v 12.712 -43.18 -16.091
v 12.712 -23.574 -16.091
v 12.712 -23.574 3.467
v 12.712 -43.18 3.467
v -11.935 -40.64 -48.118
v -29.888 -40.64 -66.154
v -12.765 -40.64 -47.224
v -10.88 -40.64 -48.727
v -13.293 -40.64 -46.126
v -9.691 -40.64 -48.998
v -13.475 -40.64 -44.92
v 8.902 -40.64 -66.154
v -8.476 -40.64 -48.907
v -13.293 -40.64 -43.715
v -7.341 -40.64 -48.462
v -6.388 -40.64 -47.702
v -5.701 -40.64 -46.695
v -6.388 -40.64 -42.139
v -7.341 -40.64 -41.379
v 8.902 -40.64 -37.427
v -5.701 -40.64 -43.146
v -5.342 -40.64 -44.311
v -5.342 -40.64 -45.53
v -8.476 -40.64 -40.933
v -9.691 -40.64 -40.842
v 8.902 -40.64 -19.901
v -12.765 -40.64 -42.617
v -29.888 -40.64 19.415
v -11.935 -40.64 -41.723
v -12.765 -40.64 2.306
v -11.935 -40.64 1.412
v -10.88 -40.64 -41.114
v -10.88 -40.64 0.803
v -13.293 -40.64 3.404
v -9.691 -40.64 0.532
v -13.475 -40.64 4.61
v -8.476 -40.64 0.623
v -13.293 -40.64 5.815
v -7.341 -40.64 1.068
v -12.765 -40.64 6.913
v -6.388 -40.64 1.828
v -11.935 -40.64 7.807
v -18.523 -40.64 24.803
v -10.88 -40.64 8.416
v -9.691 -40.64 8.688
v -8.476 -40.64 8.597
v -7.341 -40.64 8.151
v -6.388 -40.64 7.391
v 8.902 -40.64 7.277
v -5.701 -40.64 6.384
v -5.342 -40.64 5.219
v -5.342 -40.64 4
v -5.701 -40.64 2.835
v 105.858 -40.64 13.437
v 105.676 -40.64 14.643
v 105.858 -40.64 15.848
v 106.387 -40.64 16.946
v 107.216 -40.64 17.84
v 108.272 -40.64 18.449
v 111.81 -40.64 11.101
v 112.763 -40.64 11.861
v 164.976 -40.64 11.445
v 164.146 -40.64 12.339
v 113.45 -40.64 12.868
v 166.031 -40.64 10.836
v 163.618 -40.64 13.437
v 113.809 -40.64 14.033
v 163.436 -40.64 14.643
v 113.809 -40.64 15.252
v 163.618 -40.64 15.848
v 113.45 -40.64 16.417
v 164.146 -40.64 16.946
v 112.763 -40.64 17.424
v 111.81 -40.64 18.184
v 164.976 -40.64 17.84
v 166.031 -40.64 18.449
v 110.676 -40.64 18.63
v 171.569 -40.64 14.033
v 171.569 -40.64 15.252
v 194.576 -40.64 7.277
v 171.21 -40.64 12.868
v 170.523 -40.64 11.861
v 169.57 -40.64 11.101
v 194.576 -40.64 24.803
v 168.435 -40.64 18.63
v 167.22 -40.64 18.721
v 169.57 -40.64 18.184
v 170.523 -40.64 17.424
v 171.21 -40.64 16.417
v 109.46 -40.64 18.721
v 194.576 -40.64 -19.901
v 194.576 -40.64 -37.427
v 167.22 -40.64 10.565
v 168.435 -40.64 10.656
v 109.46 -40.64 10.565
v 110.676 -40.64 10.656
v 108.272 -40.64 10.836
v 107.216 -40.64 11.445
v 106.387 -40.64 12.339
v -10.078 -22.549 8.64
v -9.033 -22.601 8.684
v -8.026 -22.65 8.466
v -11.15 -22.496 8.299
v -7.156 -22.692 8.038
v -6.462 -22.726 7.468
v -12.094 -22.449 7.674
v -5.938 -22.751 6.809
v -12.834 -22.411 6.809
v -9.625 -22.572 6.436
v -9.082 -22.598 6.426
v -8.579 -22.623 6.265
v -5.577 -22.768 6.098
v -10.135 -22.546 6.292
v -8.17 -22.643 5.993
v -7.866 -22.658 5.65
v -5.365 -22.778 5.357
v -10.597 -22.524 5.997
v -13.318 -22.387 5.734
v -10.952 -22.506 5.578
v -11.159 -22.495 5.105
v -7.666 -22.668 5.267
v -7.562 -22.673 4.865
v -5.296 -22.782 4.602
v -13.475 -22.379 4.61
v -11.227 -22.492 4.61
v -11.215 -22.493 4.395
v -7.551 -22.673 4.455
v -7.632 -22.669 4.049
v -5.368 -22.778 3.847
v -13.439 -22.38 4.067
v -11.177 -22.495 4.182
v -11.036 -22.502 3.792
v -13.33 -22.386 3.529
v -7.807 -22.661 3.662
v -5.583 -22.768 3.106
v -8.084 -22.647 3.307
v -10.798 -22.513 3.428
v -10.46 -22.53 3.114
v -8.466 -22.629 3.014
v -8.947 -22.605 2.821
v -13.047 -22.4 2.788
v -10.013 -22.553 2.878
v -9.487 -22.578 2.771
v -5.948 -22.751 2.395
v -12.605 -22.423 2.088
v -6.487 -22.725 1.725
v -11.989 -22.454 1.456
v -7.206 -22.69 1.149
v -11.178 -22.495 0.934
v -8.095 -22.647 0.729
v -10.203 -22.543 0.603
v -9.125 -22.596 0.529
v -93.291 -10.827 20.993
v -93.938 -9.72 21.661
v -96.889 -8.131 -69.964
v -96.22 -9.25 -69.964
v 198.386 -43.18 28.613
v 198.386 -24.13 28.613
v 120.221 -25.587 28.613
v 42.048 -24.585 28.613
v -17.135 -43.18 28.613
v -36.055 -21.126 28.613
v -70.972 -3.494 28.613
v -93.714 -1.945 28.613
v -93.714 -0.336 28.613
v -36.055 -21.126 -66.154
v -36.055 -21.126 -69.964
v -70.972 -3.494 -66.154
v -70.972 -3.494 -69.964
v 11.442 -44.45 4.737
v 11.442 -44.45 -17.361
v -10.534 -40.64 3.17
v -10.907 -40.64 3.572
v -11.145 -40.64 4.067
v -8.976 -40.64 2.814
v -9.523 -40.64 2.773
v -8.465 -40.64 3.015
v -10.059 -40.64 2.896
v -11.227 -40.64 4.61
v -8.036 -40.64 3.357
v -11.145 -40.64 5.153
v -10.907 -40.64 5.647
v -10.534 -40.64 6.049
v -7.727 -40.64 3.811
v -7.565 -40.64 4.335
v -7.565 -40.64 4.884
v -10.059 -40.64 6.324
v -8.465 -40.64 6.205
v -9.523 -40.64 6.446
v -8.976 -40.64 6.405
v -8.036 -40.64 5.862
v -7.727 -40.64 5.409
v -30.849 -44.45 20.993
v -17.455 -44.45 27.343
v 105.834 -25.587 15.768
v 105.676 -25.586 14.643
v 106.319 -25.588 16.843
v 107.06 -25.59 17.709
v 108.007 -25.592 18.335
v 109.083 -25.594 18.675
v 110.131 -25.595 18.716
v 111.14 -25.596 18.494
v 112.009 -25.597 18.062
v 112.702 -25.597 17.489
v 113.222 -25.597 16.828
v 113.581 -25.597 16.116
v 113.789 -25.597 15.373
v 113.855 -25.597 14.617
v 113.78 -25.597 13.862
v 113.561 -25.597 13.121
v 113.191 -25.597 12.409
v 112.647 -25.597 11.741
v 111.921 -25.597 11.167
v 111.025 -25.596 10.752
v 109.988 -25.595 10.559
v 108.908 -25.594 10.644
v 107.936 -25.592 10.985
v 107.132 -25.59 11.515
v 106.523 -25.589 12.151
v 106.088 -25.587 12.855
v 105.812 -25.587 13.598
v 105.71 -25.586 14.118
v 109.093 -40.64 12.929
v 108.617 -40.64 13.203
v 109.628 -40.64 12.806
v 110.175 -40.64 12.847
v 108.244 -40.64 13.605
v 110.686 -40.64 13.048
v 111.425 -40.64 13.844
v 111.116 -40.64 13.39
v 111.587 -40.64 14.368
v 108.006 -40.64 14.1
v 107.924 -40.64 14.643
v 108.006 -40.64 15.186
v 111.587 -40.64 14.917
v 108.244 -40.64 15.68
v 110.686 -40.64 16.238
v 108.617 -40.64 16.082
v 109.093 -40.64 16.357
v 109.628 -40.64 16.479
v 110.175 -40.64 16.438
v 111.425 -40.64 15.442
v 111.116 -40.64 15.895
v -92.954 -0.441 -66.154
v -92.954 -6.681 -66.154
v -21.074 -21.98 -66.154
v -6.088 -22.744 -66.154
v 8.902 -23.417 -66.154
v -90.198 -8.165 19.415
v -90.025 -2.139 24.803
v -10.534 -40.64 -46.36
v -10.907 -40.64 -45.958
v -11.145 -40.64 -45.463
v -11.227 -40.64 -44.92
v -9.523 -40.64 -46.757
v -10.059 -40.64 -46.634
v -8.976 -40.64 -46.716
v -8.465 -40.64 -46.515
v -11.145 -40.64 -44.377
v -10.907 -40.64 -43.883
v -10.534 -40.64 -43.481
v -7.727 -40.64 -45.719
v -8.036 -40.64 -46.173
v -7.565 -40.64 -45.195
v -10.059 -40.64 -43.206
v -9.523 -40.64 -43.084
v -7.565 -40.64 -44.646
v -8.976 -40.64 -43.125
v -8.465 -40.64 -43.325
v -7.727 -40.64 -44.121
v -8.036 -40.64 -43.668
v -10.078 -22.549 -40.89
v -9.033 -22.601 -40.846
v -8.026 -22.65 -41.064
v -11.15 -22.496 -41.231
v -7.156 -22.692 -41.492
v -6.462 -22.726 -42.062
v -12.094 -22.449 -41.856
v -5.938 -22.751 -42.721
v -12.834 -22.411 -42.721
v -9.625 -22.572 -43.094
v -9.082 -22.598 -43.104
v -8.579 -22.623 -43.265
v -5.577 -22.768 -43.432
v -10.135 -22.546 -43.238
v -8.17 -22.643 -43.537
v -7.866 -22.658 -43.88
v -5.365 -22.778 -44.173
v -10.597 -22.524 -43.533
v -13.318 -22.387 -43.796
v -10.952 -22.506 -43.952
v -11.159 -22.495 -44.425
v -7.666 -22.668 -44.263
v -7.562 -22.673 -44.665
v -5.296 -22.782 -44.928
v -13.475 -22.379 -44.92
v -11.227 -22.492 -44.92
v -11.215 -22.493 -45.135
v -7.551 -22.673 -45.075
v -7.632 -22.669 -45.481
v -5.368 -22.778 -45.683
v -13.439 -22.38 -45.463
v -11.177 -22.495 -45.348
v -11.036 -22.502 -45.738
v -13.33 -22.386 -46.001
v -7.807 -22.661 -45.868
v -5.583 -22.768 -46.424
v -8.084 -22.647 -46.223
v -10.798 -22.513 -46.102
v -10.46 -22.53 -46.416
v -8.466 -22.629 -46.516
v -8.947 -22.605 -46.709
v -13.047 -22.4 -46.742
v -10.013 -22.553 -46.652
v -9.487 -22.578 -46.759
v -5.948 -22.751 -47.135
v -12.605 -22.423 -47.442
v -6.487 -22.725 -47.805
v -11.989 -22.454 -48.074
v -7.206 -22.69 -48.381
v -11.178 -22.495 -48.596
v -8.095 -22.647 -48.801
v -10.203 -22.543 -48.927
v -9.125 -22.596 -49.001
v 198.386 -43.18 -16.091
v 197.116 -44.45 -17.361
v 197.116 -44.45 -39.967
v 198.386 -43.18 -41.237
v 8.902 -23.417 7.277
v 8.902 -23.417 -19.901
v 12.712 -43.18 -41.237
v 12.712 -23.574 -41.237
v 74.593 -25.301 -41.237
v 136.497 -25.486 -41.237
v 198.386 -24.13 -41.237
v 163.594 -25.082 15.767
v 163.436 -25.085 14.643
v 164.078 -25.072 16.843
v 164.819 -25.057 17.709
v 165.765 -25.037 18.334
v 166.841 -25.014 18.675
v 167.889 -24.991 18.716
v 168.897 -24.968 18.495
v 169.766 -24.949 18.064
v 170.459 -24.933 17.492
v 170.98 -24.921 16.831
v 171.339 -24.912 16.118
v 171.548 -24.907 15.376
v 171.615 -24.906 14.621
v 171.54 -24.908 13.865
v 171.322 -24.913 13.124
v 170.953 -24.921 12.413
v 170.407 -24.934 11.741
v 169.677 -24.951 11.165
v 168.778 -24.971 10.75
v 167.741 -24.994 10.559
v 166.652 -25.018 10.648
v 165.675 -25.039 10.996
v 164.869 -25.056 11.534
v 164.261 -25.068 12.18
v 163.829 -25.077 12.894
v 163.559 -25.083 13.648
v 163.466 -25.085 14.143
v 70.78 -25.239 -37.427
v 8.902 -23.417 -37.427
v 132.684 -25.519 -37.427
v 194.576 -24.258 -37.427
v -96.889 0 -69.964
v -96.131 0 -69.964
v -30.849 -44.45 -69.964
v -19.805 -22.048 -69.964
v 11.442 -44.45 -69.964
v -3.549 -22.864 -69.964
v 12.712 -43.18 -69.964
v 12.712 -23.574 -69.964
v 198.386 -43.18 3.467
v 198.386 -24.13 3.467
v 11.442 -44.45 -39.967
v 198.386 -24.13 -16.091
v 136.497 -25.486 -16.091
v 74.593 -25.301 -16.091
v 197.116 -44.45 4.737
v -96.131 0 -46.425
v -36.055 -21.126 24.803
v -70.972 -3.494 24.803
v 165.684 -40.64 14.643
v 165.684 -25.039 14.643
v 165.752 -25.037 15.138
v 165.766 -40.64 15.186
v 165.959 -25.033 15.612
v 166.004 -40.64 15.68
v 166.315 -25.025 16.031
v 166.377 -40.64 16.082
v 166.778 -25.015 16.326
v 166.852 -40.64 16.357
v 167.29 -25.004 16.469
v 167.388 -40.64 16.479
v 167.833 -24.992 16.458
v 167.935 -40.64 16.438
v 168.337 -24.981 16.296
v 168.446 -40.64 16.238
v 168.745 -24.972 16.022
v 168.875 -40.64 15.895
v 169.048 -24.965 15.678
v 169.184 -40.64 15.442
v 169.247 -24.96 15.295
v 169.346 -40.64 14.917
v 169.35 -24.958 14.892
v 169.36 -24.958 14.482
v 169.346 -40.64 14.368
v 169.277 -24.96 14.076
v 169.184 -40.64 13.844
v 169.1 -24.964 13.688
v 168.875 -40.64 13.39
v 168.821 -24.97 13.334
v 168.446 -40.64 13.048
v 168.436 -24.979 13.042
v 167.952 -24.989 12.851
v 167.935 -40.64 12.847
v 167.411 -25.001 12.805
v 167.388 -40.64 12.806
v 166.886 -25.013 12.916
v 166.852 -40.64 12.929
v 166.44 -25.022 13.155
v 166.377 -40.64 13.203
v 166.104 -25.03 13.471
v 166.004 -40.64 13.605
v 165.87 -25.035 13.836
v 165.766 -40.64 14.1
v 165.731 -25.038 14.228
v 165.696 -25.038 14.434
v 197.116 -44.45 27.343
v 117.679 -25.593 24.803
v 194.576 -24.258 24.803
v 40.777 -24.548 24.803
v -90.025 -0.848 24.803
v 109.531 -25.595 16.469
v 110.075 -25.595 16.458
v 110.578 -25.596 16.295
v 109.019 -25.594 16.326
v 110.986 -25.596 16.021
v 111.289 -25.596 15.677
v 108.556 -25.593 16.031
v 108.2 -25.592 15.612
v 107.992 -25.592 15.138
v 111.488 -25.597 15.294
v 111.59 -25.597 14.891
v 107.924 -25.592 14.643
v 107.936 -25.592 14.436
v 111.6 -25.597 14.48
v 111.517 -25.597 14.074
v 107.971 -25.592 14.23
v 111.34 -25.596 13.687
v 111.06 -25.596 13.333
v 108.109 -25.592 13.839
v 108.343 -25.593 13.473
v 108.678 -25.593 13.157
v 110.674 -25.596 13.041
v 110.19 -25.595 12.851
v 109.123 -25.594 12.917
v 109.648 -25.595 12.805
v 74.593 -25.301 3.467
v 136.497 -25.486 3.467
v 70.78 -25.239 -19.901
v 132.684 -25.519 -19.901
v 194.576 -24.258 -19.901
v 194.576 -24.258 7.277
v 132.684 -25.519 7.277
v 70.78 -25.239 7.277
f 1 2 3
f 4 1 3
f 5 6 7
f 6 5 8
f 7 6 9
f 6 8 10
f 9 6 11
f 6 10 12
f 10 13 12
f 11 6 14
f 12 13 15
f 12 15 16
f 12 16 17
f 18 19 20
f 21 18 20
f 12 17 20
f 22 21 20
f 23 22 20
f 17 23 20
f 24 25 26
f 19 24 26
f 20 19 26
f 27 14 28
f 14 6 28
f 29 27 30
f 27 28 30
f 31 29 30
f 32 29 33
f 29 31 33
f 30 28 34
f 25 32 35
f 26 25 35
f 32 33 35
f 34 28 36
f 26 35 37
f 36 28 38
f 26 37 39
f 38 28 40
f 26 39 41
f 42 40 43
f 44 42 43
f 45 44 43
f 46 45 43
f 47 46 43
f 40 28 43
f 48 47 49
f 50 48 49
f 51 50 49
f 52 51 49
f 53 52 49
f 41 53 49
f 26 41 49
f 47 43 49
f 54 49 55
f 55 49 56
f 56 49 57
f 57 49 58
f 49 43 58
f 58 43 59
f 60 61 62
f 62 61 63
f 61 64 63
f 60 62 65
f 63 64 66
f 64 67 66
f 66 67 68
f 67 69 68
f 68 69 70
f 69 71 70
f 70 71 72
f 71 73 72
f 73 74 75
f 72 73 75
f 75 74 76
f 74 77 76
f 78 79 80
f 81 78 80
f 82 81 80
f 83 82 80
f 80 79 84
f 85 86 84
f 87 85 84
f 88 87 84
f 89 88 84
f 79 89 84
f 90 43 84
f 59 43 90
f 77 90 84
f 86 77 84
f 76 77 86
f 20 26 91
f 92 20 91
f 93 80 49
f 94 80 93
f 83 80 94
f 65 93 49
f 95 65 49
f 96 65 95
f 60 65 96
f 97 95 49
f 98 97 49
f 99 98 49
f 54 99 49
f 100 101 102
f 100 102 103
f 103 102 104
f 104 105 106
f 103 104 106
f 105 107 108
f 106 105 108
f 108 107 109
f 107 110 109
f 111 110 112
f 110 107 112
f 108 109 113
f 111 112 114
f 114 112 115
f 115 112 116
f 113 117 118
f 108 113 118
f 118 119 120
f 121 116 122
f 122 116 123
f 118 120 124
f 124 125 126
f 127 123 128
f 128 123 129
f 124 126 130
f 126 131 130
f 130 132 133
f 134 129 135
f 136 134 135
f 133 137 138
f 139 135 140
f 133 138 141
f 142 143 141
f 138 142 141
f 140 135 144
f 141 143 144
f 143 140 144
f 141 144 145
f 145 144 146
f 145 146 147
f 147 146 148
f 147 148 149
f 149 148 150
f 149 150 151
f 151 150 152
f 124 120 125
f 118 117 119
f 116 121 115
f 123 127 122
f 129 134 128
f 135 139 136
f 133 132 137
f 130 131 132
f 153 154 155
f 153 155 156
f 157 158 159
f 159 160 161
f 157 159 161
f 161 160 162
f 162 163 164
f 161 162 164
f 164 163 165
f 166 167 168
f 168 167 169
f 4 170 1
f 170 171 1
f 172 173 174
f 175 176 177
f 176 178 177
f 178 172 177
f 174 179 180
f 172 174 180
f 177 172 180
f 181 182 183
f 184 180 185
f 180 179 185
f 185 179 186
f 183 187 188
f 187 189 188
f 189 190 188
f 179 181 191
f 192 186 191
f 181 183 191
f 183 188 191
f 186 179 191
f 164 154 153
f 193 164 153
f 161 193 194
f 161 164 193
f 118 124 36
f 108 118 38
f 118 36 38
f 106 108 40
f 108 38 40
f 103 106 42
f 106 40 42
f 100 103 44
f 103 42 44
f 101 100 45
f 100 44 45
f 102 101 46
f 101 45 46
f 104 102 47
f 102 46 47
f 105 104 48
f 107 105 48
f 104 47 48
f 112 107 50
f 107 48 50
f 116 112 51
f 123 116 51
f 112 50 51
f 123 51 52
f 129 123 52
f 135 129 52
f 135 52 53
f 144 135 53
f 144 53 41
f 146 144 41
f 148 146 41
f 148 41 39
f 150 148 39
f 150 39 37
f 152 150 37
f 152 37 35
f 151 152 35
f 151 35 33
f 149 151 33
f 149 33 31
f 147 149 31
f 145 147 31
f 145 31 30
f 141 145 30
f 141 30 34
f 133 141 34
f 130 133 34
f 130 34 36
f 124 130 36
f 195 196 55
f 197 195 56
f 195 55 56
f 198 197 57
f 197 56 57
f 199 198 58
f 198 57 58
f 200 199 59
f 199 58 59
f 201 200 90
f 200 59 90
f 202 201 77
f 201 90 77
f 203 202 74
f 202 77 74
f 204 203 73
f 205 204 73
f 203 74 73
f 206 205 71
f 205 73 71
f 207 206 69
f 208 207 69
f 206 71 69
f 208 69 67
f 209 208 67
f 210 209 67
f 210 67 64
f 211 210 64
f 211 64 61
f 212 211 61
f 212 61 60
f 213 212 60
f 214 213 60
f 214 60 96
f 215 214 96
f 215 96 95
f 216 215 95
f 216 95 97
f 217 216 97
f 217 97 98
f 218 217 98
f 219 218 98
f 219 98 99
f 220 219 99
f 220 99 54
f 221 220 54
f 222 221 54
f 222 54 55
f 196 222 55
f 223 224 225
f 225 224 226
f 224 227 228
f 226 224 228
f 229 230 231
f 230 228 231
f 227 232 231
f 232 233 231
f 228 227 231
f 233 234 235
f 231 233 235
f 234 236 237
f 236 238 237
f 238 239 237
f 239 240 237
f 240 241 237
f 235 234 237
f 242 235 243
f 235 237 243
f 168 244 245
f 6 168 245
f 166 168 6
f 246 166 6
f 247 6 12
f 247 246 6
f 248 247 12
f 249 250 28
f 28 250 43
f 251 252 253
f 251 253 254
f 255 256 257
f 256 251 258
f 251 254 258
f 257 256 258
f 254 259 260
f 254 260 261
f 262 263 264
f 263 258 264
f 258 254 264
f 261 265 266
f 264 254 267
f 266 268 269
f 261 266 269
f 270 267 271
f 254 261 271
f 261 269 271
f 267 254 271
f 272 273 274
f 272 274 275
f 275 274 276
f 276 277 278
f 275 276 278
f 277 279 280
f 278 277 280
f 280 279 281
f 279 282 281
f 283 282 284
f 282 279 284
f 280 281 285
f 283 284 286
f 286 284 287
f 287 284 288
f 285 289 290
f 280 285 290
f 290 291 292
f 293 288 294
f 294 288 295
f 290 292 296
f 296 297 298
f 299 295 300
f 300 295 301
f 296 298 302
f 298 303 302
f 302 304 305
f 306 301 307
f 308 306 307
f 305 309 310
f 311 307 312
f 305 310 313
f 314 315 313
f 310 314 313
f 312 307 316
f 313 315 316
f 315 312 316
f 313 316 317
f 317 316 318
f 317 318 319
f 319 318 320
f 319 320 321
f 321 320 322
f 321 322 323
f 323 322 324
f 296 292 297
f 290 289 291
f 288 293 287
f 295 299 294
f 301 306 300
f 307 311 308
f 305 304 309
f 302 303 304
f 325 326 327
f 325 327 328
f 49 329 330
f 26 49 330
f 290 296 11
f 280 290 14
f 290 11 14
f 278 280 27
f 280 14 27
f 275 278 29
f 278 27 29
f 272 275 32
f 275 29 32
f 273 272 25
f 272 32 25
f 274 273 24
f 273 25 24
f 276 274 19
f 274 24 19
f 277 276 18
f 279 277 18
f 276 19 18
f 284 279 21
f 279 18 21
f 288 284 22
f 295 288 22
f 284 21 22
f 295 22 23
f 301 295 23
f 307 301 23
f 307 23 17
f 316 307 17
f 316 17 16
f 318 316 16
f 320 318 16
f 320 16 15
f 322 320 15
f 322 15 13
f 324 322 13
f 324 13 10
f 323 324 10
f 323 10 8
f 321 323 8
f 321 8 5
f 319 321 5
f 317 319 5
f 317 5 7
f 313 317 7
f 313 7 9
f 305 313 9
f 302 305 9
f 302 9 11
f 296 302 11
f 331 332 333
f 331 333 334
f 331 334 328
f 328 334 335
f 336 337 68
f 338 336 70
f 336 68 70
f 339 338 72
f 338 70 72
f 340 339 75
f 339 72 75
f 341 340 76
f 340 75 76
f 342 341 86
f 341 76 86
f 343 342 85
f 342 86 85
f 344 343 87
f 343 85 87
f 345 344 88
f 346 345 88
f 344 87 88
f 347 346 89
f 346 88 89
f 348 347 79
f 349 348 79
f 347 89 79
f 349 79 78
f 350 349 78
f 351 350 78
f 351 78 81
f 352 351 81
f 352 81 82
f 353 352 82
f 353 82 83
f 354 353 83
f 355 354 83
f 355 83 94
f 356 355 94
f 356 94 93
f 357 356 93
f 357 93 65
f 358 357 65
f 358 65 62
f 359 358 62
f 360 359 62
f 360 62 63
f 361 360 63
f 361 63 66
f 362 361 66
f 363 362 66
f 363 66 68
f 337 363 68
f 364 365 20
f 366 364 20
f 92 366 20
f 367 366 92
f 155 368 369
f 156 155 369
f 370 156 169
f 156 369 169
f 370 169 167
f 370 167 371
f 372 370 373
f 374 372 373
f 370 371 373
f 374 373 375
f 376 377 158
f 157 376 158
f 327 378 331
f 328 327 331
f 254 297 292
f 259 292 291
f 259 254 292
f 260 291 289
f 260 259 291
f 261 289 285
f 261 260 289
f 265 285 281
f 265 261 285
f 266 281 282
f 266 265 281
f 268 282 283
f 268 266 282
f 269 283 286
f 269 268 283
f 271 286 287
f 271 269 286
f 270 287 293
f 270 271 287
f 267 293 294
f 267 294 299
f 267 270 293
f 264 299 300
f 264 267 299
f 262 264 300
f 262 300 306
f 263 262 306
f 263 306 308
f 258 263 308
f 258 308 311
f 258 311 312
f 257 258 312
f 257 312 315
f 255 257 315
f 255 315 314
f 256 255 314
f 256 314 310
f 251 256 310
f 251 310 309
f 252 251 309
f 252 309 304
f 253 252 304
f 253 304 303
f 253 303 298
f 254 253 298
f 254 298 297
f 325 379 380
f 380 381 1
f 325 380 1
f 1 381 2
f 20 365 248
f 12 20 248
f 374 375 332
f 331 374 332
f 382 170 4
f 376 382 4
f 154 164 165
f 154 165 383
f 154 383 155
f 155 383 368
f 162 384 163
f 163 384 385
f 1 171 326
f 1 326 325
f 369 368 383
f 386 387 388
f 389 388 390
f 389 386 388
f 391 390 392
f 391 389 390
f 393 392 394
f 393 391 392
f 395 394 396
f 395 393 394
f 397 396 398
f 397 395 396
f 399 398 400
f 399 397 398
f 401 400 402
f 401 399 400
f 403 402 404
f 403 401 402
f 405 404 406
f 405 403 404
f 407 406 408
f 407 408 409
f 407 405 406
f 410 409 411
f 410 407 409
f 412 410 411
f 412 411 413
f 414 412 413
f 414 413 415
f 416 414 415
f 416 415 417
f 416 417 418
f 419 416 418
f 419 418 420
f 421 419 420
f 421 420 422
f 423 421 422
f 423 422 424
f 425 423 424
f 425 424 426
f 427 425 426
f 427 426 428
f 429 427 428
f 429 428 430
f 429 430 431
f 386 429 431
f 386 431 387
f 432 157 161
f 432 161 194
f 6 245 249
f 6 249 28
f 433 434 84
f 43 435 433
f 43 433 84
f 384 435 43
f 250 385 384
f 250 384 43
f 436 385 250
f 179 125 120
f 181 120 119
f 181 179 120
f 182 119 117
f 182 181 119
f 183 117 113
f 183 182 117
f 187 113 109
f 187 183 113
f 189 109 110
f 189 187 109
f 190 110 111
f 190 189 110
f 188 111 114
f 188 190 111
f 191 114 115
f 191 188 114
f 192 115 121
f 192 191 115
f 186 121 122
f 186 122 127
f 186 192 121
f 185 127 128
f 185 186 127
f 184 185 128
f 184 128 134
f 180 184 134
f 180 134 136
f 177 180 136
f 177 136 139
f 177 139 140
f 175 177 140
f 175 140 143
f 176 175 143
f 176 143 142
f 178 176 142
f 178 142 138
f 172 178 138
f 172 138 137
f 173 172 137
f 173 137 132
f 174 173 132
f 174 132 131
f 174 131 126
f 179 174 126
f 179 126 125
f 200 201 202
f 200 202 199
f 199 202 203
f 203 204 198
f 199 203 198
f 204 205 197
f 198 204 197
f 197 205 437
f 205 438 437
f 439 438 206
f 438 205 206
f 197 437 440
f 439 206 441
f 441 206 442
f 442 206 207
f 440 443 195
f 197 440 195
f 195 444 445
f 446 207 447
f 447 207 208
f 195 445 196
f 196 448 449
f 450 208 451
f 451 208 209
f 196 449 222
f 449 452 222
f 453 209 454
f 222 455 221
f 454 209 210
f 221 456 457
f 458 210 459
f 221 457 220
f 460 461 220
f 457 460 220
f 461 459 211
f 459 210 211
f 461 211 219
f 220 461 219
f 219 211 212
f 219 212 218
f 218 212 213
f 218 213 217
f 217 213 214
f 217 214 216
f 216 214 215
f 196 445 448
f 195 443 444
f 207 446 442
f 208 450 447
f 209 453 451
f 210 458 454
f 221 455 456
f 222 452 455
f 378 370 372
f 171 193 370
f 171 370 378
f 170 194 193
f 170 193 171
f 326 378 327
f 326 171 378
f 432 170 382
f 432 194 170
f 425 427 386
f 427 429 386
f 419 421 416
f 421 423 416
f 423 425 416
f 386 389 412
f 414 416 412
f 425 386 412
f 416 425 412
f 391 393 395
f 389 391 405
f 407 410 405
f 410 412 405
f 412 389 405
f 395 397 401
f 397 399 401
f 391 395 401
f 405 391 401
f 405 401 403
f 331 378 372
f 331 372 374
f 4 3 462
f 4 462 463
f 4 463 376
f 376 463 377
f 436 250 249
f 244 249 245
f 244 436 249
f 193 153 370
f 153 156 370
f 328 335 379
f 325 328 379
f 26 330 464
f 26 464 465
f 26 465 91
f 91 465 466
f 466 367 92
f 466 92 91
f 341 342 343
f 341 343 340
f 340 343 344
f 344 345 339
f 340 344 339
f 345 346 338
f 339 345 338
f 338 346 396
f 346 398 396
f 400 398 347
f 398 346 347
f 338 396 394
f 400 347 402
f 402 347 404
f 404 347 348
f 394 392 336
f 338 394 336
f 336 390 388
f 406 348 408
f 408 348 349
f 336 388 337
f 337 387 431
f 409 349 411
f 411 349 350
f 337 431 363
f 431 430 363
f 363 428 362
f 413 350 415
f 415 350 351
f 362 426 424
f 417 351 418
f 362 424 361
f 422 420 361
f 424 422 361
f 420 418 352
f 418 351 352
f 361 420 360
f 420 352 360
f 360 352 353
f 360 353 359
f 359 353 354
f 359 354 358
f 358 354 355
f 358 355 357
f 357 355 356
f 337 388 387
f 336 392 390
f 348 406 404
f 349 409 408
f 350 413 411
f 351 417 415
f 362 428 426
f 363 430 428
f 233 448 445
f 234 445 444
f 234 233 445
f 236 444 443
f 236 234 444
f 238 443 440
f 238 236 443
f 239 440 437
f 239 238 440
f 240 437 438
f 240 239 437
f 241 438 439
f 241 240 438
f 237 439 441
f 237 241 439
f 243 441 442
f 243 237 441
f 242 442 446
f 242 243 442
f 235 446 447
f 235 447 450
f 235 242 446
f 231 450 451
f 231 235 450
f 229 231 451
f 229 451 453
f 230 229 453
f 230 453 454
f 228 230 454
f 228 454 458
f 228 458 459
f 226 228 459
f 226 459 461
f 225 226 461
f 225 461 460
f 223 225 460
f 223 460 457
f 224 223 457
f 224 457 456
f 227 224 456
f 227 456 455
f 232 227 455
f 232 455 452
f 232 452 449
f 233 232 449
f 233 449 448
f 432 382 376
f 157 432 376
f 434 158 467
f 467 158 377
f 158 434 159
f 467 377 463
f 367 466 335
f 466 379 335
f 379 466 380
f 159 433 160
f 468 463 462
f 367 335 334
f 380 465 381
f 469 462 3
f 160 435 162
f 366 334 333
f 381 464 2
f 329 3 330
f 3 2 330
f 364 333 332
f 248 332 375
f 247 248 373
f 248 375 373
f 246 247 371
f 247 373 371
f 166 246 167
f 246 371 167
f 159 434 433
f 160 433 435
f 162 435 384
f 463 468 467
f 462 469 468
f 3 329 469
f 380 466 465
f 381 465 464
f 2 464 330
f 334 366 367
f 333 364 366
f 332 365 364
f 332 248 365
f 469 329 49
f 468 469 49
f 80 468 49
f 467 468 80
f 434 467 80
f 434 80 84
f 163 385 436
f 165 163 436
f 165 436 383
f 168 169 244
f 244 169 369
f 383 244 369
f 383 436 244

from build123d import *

# Parameters (mm, degrees)
F1_DEPTH     = 44.45
F4_DEPTH     = 98.5780825813
F5_SIZE      = 7.62
F6_T1_DEPTH  = 219.6945102582
F6_T3_DEPTH  = 31.6780747894
F6_T5_DEPTH  = 188.9400373947
F6_T7_DEPTH  = 31.6780747894
F6_T9_DEPTH  = 31.993119976
F6_T11_DEPTH = 19.558
F6_T13_DEPTH = 95.0320985588
F6_T19_DEPTH = 188.9400373947
F6_T23_DEPTH = 22.8240373947
F6_T30_DEPTH = 22.8240373947
F6_T34_DEPTH = 188.9400373947
F6_T41_DEPTH = 31.993119976
F6_T45_DEPTH = 188.9400373947
F7_T         = 3.81
F7_T3_DEPTH  = 9.8197045255
F7_T5_DEPTH  = 50.8
F7_T7_DEPTH  = 9.8197045256
F7_T9_DEPTH  = 9.8197045255
F8_R         = 4.0894
F8_R_2       = 1.8415
F9_DEPTH     = 40.64
F10_DEPTH    = 127


# Not quite as in the source:
# - a fillet or chamfer that OpenCascade refuses, or shapes differently, is made with other operations: its cross-section is extruded or revolved along the edge and cut away or added
# - a shell that OpenCascade refuses in one call is made with other operations: the cavity is built on its own and cut out


with BuildPart() as f1:
    # F0 (on Front) → F1 (new body)
    with BuildSketch(Plane.XZ):
        Polygon((-27.6737742102, 28.612719938), (-93.7137742102, 28.612719938), (-96.8887742102, -69.9643626433), (-17.5137742102, -69.9643626433), (12.7122257898, -69.9643626433), (12.7122257898, -41.237280062), (198.3862257898, -41.237280062), (198.3862257898, -16.091280062), (12.7122257898, -16.091280062), (12.7122257898, 3.466719938), (198.3862257898, 3.466719938), (198.3862257898, 28.612719938), align=None)
    extrude(amount=F1_DEPTH)

    # F2 (on face) → F4 (cut, through all)
    with BuildSketch(Plane(origin=(0, 0, -69.9643626433), x_dir=(1, 0, 0), z_dir=(0, 0, -1))):
        Polygon((-96.8887742102, 44.45), (-96.8887742102, 8.89), (-30.8487742102, 44.45), align=None)
    extrude(amount=-F4_DEPTH, mode=Mode.SUBTRACT)

    # F5
    f5_edges = [f1.edges().sort_by_distance(p)[0] for p in [
        (-62.281274, -27.524808, 28.61272),
    ]]
    chamfer(f5_edges, length=F5_SIZE)

    # F6: chamfer of 1.27 on 9 edges, made by hand

    # F6_s2 → F6_t1 (cut)
    with BuildSketch(Plane.YZ.offset(-18.0422470736)):
        Polygon((-43.18, 28.612719938), (-44.45, 27.342719938), (-44.45, 28.612719938), align=None)
    extrude(amount=F6_T1_DEPTH, mode=Mode.SUBTRACT)

    # F6_s4 → F6_t3 (cut)
    with BuildSketch(Plane.XY.offset(0.2006825433)):
        Polygon((197.1162257898, -44.45), (198.3862257898, -43.18), (198.3862257898, -44.45), align=None)
    extrude(amount=F6_T3_DEPTH, mode=Mode.SUBTRACT)

    # F6_s6 → F6_t5 (cut)
    with BuildSketch(Plane.YZ.offset(12.7122257898)):
        Polygon((-44.45, 4.736719938), (-43.18, 3.466719938), (-44.45, 3.466719938), align=None)
        Polygon((-44.45, -17.361280062), (-43.18, -16.091280062), (-44.45, -16.091280062), align=None)
        Polygon((-44.45, -39.967280062), (-43.18, -41.237280062), (-44.45, -41.237280062), align=None)
    extrude(amount=F6_T5_DEPTH, mode=Mode.SUBTRACT)

    # F6_s8 → F6_t7 (cut)
    with BuildSketch(Plane.XY.offset(-44.5033174567)):
        Polygon((197.1162257898, -44.45), (198.3862257898, -43.18), (198.3862257898, -44.45), align=None)
    extrude(amount=F6_T7_DEPTH, mode=Mode.SUBTRACT)

    # F6_s10 → F6_t9 (cut)
    with BuildSketch(Plane.XY.offset(-73.230400038)):
        Polygon((11.4422257898, -44.45), (12.7122257898, -43.18), (12.7122257898, -44.45), align=None)
    extrude(amount=F6_T9_DEPTH, mode=Mode.SUBTRACT)

    # F6_s12 → F6_t11 (cut)
    with BuildSketch(Plane.XY.offset(-16.091280062)):
        Polygon((11.4422257898, -44.45), (12.7122257898, -43.18), (12.7122257898, -44.45), align=None)
    extrude(amount=F6_T11_DEPTH, mode=Mode.SUBTRACT)

    # F6_s14 → F6_t13 (cut)
    with BuildSketch(Plane(origin=(-2.4104397516, 1.297929097, -74.8390924249), x_dir=(0.474099823, 0.8804710999, 0), z_dir=(0.0321867693, -0.0173313373, 0.9993315949))):
        Polygon((-53.0941334984, 78.8407390233), (-53.7623387855, 77.722372749), (-53.7623387855, 78.4811766705), align=None)
    extrude(amount=F6_T13_DEPTH, mode=Mode.SUBTRACT)


with BuildPart() as f6_tool17:
    # F6_s18 → F6_t19 (new body)
    with BuildSketch(Plane.YZ.offset(9.4461883951)):
        Polygon((-44.45, 4.736719938), (-43.18, 3.466719938), (-44.45, 3.466719938), align=None)
    extrude(amount=F6_T19_DEPTH)

    split(bisect_by=Plane.YZ.offset(12.7122257898), keep=Keep.BOTTOM)


with BuildPart() as f6_tool21:
    # F6_s22 → F6_t23 (new body)
    with BuildSketch(Plane.XY.offset(-16.091280062)):
        Polygon((11.4422257898, -44.45), (12.7122257898, -43.18), (12.7122257898, -44.45), align=None)
    extrude(amount=F6_T23_DEPTH)

    split(bisect_by=Plane.XY.offset(3.466719938), keep=Keep.TOP)


with BuildPart() as f6_tool17_1:
    add(f6_tool17.part)

    # F6_t25: intersect F6_tool21
    add(f6_tool21.part, mode=Mode.INTERSECT)


with BuildPart() as f1_1:
    add(f1.part)

    # F6_t15: cut F6_tool17
    add(f6_tool17_1.part, mode=Mode.SUBTRACT)


with BuildPart() as f6_tool28:
    # F6_s29 → F6_t30 (new body)
    with BuildSketch(Plane.XY.offset(-19.3573174567)):
        Polygon((11.4422257898, -44.45), (12.7122257898, -43.18), (12.7122257898, -44.45), align=None)
    extrude(amount=F6_T30_DEPTH)

    split(bisect_by=Plane.XY.offset(-16.091280062), keep=Keep.BOTTOM)


with BuildPart() as f6_tool32:
    # F6_s33 → F6_t34 (new body)
    with BuildSketch(Plane.YZ.offset(198.3862257898)):
        Polygon((-44.45, -17.361280062), (-43.18, -16.091280062), (-44.45, -16.091280062), align=None)
    extrude(amount=-F6_T34_DEPTH)

    split(bisect_by=Plane.YZ.offset(12.7122257898), keep=Keep.BOTTOM)


with BuildPart() as f6_tool28_1:
    add(f6_tool28.part)

    # F6_t36: intersect F6_tool32
    add(f6_tool32.part, mode=Mode.INTERSECT)


with BuildPart() as f1_2:
    add(f1_1.part)

    # F6_t26: cut F6_tool28
    add(f6_tool28_1.part, mode=Mode.SUBTRACT)


with BuildPart() as f6_tool39:
    # F6_s40 → F6_t41 (new body)
    with BuildSketch(Plane.XY.offset(-69.9643626433)):
        Polygon((11.4422257898, -44.45), (12.7122257898, -43.18), (12.7122257898, -44.45), align=None)
    extrude(amount=F6_T41_DEPTH)

    split(bisect_by=Plane.XY.offset(-41.237280062), keep=Keep.TOP)


with BuildPart() as f6_tool43:
    # F6_s44 → F6_t45 (new body)
    with BuildSketch(Plane.YZ.offset(9.4461883951)):
        Polygon((-44.45, -39.967280062), (-43.18, -41.237280062), (-44.45, -41.237280062), align=None)
    extrude(amount=F6_T45_DEPTH)

    split(bisect_by=Plane.YZ.offset(12.7122257898), keep=Keep.BOTTOM)


with BuildPart() as f6_tool39_1:
    add(f6_tool39.part)

    # F6_t47: intersect F6_tool43
    add(f6_tool43.part, mode=Mode.INTERSECT)


with BuildPart() as f1_3:
    add(f1_2.part)

    # F6_t37: cut F6_tool39
    add(f6_tool39_1.part, mode=Mode.SUBTRACT)

    # F7: shell of thickness 3.81, made by hand


with BuildPart() as f7_core1:
    # F7_t2: copy of F1
    add(f1_3.part)

    # the walls: a layer under each face that stays
    f7_faces = [f7_core1.faces().sort_by_distance(p)[0] for p in [
        (52.3362257898, -21.59, 28.612719938),
        (-95.3012742102, -4.8600664948, -20.6758213526),
        (-95.0796094442, -9.4847066882, -24.1721603779),
        (-63.5344983168, -26.8499947118, -24.4858213526),
        (83.1337257898, -44.45, -21.3108213526),
        (197.7512257898, -43.815, 16.039719938),
        (104.9142257898, -43.815, 4.101719938),
        (105.5492257898, -21.59, 3.466719938),
        (12.7122257898, -21.59, -6.312280062),
        (105.5492257898, -21.59, -16.091280062),
        (198.3862257898, -21.59, -28.664280062),
        (105.5492257898, -21.59, -41.237280062),
        (12.7122257898, -21.59, -55.6008213526),
        (12.0772257898, -43.815, -6.312280062),
        (104.9142257898, -43.815, -16.726280062),
        (197.7512257898, -43.815, -28.664280062),
        (104.9142257898, -43.815, -40.602280062),
        (12.0772257898, -43.815, -54.9658213526),
        (-42.0882742102, -22.225, -69.9643626433),
        (198.3862257898, -21.59, 16.039719938),
        (90.4656276778, -43.815, 27.977719938),
        (-57.0896392603, -25.9930745223, 24.802719938),
    ]]
    thicken(f7_faces, amount=-F7_T, mode=Mode.SUBTRACT)

    # F7_s4 → F7_t3 (cut)
    with BuildSketch(Plane(origin=(-9.1117935238, -9.1117935238, 9.1117935238), x_dir=(0.7071067812, -0.7071067812, 0), z_dir=(-0.5773502692, -0.5773502692, 0.5773502692))):
        Polygon((39.5789218716, -9.640847327), (37.6167718716, -6.3082949707), (35.7117718716, -7.4081472335), (35.7117718716, -9.6078517591), align=None)
    extrude(amount=F7_T3_DEPTH, mode=Mode.SUBTRACT)

    # F7_s6 → F7_t5 (cut)
    with BuildSketch(Plane.XZ.offset(-3.81)):
        Polygon((12.7503257898, 3.428619938), (12.7122257898, 7.276719938), (8.9022257898, 7.276719938), (8.9022257898, 3.466719938), align=None)
        Polygon((12.7503257898, -16.053180062), (8.9022257898, -16.091280062), (8.9022257898, -19.901280062), (12.7122257898, -19.901280062), align=None)
        Polygon((12.7503257898, -41.275380062), (12.7122257898, -37.427280062), (8.9022257898, -37.427280062), (8.9022257898, -41.237280062), align=None)
    extrude(amount=F7_T5_DEPTH, mode=Mode.SUBTRACT)

    # F7_s8 → F7_t7 (cut)
    with BuildSketch(Plane(origin=(-13.3199802318, -13.3199802318, -13.3199802318), x_dir=(0.7071067812, -0.7071067812, 0), z_dir=(-0.5773502692, -0.5773502692, -0.5773502692))):
        Polygon((39.5789218716, -0.6670628499), (35.7117718716, -0.7000584178), (35.7117718716, -2.8997629434), (37.6167718716, -3.9996152062), align=None)
    extrude(amount=F7_T7_DEPTH, mode=Mode.SUBTRACT)

    # F7_s10 → F7_t9 (cut)
    with BuildSketch(Plane(origin=(0.1201307583, 0.1201307583, -0.1201307583), x_dir=(-0.7071067812, 0.7071067812, 0), z_dir=(0.5773502692, 0.5773502692, -0.5773502692))):
        Polygon((-39.5789218716, -46.1415104808), (-37.6167718716, -42.8089581245), (-35.7117718716, -43.9088103873), (-35.7117718716, -46.1085149129), align=None)
    extrude(amount=F7_T9_DEPTH, mode=Mode.SUBTRACT)


with BuildPart() as f1_4:
    add(f1_3.part)

    # what is left inside the walls is the cavity
    f7_cavity = [f7_core1.part.solids().sort_by_distance(p)[0] for p in [
        (50.81107, -0.0381, -35.835335),
    ]]
    add(f7_cavity, mode=Mode.SUBTRACT)

    # F8 (on face) → F9 (join, through all)
    with BuildSketch(Plane(origin=(0, -40.64, 0), x_dir=(-1, 0, 0), z_dir=(0, 1, 0))):
        with Locations((-167.5252257898, 14.642719938)):
            Circle(F8_R)
        with Locations((-167.5252257898, 14.642719938)):
            Circle(F8_R_2, mode=Mode.SUBTRACT)
        with Locations((-109.7656257898, 14.642719938)):
            Circle(F8_R)
        with Locations((-109.7656257898, 14.642719938)):
            Circle(F8_R_2, mode=Mode.SUBTRACT)
        with Locations((9.3857742102, -44.920280062)):
            Circle(F8_R)
        with Locations((9.3857742102, -44.920280062)):
            Circle(F8_R_2, mode=Mode.SUBTRACT)
        with Locations((9.3857742102, 4.609719938)):
            Circle(F8_R)
        with Locations((9.3857742102, 4.609719938)):
            Circle(F8_R_2, mode=Mode.SUBTRACT)
    extrude(amount=F9_DEPTH)

    # F3 (on face) → F10 (cut, symmetric)
    with BuildSketch(Plane(origin=(0, 0, -41.237280062), x_dir=(1, 0, 0), z_dir=(0, 0, -1))):
        with BuildLine():
            Line((-70.9720987785, 3.4942372568), (-96.1306024302, 0))
            Line((-96.1306024302, 0), (198.3862257898, 0))
            Line((198.3862257898, 0), (198.3862257898, 24.13))
            ThreePointArc((198.3862257898, 24.13), (81.1301273633, 25.39290124), (-36.0551004282, 21.1255923438))
            Line((-36.0551004282, 21.1255923438), (-70.9720987785, 3.4942372568))
        make_face()
    extrude(amount=F10_DEPTH, both=True, mode=Mode.SUBTRACT)


solid = f1_4.part
